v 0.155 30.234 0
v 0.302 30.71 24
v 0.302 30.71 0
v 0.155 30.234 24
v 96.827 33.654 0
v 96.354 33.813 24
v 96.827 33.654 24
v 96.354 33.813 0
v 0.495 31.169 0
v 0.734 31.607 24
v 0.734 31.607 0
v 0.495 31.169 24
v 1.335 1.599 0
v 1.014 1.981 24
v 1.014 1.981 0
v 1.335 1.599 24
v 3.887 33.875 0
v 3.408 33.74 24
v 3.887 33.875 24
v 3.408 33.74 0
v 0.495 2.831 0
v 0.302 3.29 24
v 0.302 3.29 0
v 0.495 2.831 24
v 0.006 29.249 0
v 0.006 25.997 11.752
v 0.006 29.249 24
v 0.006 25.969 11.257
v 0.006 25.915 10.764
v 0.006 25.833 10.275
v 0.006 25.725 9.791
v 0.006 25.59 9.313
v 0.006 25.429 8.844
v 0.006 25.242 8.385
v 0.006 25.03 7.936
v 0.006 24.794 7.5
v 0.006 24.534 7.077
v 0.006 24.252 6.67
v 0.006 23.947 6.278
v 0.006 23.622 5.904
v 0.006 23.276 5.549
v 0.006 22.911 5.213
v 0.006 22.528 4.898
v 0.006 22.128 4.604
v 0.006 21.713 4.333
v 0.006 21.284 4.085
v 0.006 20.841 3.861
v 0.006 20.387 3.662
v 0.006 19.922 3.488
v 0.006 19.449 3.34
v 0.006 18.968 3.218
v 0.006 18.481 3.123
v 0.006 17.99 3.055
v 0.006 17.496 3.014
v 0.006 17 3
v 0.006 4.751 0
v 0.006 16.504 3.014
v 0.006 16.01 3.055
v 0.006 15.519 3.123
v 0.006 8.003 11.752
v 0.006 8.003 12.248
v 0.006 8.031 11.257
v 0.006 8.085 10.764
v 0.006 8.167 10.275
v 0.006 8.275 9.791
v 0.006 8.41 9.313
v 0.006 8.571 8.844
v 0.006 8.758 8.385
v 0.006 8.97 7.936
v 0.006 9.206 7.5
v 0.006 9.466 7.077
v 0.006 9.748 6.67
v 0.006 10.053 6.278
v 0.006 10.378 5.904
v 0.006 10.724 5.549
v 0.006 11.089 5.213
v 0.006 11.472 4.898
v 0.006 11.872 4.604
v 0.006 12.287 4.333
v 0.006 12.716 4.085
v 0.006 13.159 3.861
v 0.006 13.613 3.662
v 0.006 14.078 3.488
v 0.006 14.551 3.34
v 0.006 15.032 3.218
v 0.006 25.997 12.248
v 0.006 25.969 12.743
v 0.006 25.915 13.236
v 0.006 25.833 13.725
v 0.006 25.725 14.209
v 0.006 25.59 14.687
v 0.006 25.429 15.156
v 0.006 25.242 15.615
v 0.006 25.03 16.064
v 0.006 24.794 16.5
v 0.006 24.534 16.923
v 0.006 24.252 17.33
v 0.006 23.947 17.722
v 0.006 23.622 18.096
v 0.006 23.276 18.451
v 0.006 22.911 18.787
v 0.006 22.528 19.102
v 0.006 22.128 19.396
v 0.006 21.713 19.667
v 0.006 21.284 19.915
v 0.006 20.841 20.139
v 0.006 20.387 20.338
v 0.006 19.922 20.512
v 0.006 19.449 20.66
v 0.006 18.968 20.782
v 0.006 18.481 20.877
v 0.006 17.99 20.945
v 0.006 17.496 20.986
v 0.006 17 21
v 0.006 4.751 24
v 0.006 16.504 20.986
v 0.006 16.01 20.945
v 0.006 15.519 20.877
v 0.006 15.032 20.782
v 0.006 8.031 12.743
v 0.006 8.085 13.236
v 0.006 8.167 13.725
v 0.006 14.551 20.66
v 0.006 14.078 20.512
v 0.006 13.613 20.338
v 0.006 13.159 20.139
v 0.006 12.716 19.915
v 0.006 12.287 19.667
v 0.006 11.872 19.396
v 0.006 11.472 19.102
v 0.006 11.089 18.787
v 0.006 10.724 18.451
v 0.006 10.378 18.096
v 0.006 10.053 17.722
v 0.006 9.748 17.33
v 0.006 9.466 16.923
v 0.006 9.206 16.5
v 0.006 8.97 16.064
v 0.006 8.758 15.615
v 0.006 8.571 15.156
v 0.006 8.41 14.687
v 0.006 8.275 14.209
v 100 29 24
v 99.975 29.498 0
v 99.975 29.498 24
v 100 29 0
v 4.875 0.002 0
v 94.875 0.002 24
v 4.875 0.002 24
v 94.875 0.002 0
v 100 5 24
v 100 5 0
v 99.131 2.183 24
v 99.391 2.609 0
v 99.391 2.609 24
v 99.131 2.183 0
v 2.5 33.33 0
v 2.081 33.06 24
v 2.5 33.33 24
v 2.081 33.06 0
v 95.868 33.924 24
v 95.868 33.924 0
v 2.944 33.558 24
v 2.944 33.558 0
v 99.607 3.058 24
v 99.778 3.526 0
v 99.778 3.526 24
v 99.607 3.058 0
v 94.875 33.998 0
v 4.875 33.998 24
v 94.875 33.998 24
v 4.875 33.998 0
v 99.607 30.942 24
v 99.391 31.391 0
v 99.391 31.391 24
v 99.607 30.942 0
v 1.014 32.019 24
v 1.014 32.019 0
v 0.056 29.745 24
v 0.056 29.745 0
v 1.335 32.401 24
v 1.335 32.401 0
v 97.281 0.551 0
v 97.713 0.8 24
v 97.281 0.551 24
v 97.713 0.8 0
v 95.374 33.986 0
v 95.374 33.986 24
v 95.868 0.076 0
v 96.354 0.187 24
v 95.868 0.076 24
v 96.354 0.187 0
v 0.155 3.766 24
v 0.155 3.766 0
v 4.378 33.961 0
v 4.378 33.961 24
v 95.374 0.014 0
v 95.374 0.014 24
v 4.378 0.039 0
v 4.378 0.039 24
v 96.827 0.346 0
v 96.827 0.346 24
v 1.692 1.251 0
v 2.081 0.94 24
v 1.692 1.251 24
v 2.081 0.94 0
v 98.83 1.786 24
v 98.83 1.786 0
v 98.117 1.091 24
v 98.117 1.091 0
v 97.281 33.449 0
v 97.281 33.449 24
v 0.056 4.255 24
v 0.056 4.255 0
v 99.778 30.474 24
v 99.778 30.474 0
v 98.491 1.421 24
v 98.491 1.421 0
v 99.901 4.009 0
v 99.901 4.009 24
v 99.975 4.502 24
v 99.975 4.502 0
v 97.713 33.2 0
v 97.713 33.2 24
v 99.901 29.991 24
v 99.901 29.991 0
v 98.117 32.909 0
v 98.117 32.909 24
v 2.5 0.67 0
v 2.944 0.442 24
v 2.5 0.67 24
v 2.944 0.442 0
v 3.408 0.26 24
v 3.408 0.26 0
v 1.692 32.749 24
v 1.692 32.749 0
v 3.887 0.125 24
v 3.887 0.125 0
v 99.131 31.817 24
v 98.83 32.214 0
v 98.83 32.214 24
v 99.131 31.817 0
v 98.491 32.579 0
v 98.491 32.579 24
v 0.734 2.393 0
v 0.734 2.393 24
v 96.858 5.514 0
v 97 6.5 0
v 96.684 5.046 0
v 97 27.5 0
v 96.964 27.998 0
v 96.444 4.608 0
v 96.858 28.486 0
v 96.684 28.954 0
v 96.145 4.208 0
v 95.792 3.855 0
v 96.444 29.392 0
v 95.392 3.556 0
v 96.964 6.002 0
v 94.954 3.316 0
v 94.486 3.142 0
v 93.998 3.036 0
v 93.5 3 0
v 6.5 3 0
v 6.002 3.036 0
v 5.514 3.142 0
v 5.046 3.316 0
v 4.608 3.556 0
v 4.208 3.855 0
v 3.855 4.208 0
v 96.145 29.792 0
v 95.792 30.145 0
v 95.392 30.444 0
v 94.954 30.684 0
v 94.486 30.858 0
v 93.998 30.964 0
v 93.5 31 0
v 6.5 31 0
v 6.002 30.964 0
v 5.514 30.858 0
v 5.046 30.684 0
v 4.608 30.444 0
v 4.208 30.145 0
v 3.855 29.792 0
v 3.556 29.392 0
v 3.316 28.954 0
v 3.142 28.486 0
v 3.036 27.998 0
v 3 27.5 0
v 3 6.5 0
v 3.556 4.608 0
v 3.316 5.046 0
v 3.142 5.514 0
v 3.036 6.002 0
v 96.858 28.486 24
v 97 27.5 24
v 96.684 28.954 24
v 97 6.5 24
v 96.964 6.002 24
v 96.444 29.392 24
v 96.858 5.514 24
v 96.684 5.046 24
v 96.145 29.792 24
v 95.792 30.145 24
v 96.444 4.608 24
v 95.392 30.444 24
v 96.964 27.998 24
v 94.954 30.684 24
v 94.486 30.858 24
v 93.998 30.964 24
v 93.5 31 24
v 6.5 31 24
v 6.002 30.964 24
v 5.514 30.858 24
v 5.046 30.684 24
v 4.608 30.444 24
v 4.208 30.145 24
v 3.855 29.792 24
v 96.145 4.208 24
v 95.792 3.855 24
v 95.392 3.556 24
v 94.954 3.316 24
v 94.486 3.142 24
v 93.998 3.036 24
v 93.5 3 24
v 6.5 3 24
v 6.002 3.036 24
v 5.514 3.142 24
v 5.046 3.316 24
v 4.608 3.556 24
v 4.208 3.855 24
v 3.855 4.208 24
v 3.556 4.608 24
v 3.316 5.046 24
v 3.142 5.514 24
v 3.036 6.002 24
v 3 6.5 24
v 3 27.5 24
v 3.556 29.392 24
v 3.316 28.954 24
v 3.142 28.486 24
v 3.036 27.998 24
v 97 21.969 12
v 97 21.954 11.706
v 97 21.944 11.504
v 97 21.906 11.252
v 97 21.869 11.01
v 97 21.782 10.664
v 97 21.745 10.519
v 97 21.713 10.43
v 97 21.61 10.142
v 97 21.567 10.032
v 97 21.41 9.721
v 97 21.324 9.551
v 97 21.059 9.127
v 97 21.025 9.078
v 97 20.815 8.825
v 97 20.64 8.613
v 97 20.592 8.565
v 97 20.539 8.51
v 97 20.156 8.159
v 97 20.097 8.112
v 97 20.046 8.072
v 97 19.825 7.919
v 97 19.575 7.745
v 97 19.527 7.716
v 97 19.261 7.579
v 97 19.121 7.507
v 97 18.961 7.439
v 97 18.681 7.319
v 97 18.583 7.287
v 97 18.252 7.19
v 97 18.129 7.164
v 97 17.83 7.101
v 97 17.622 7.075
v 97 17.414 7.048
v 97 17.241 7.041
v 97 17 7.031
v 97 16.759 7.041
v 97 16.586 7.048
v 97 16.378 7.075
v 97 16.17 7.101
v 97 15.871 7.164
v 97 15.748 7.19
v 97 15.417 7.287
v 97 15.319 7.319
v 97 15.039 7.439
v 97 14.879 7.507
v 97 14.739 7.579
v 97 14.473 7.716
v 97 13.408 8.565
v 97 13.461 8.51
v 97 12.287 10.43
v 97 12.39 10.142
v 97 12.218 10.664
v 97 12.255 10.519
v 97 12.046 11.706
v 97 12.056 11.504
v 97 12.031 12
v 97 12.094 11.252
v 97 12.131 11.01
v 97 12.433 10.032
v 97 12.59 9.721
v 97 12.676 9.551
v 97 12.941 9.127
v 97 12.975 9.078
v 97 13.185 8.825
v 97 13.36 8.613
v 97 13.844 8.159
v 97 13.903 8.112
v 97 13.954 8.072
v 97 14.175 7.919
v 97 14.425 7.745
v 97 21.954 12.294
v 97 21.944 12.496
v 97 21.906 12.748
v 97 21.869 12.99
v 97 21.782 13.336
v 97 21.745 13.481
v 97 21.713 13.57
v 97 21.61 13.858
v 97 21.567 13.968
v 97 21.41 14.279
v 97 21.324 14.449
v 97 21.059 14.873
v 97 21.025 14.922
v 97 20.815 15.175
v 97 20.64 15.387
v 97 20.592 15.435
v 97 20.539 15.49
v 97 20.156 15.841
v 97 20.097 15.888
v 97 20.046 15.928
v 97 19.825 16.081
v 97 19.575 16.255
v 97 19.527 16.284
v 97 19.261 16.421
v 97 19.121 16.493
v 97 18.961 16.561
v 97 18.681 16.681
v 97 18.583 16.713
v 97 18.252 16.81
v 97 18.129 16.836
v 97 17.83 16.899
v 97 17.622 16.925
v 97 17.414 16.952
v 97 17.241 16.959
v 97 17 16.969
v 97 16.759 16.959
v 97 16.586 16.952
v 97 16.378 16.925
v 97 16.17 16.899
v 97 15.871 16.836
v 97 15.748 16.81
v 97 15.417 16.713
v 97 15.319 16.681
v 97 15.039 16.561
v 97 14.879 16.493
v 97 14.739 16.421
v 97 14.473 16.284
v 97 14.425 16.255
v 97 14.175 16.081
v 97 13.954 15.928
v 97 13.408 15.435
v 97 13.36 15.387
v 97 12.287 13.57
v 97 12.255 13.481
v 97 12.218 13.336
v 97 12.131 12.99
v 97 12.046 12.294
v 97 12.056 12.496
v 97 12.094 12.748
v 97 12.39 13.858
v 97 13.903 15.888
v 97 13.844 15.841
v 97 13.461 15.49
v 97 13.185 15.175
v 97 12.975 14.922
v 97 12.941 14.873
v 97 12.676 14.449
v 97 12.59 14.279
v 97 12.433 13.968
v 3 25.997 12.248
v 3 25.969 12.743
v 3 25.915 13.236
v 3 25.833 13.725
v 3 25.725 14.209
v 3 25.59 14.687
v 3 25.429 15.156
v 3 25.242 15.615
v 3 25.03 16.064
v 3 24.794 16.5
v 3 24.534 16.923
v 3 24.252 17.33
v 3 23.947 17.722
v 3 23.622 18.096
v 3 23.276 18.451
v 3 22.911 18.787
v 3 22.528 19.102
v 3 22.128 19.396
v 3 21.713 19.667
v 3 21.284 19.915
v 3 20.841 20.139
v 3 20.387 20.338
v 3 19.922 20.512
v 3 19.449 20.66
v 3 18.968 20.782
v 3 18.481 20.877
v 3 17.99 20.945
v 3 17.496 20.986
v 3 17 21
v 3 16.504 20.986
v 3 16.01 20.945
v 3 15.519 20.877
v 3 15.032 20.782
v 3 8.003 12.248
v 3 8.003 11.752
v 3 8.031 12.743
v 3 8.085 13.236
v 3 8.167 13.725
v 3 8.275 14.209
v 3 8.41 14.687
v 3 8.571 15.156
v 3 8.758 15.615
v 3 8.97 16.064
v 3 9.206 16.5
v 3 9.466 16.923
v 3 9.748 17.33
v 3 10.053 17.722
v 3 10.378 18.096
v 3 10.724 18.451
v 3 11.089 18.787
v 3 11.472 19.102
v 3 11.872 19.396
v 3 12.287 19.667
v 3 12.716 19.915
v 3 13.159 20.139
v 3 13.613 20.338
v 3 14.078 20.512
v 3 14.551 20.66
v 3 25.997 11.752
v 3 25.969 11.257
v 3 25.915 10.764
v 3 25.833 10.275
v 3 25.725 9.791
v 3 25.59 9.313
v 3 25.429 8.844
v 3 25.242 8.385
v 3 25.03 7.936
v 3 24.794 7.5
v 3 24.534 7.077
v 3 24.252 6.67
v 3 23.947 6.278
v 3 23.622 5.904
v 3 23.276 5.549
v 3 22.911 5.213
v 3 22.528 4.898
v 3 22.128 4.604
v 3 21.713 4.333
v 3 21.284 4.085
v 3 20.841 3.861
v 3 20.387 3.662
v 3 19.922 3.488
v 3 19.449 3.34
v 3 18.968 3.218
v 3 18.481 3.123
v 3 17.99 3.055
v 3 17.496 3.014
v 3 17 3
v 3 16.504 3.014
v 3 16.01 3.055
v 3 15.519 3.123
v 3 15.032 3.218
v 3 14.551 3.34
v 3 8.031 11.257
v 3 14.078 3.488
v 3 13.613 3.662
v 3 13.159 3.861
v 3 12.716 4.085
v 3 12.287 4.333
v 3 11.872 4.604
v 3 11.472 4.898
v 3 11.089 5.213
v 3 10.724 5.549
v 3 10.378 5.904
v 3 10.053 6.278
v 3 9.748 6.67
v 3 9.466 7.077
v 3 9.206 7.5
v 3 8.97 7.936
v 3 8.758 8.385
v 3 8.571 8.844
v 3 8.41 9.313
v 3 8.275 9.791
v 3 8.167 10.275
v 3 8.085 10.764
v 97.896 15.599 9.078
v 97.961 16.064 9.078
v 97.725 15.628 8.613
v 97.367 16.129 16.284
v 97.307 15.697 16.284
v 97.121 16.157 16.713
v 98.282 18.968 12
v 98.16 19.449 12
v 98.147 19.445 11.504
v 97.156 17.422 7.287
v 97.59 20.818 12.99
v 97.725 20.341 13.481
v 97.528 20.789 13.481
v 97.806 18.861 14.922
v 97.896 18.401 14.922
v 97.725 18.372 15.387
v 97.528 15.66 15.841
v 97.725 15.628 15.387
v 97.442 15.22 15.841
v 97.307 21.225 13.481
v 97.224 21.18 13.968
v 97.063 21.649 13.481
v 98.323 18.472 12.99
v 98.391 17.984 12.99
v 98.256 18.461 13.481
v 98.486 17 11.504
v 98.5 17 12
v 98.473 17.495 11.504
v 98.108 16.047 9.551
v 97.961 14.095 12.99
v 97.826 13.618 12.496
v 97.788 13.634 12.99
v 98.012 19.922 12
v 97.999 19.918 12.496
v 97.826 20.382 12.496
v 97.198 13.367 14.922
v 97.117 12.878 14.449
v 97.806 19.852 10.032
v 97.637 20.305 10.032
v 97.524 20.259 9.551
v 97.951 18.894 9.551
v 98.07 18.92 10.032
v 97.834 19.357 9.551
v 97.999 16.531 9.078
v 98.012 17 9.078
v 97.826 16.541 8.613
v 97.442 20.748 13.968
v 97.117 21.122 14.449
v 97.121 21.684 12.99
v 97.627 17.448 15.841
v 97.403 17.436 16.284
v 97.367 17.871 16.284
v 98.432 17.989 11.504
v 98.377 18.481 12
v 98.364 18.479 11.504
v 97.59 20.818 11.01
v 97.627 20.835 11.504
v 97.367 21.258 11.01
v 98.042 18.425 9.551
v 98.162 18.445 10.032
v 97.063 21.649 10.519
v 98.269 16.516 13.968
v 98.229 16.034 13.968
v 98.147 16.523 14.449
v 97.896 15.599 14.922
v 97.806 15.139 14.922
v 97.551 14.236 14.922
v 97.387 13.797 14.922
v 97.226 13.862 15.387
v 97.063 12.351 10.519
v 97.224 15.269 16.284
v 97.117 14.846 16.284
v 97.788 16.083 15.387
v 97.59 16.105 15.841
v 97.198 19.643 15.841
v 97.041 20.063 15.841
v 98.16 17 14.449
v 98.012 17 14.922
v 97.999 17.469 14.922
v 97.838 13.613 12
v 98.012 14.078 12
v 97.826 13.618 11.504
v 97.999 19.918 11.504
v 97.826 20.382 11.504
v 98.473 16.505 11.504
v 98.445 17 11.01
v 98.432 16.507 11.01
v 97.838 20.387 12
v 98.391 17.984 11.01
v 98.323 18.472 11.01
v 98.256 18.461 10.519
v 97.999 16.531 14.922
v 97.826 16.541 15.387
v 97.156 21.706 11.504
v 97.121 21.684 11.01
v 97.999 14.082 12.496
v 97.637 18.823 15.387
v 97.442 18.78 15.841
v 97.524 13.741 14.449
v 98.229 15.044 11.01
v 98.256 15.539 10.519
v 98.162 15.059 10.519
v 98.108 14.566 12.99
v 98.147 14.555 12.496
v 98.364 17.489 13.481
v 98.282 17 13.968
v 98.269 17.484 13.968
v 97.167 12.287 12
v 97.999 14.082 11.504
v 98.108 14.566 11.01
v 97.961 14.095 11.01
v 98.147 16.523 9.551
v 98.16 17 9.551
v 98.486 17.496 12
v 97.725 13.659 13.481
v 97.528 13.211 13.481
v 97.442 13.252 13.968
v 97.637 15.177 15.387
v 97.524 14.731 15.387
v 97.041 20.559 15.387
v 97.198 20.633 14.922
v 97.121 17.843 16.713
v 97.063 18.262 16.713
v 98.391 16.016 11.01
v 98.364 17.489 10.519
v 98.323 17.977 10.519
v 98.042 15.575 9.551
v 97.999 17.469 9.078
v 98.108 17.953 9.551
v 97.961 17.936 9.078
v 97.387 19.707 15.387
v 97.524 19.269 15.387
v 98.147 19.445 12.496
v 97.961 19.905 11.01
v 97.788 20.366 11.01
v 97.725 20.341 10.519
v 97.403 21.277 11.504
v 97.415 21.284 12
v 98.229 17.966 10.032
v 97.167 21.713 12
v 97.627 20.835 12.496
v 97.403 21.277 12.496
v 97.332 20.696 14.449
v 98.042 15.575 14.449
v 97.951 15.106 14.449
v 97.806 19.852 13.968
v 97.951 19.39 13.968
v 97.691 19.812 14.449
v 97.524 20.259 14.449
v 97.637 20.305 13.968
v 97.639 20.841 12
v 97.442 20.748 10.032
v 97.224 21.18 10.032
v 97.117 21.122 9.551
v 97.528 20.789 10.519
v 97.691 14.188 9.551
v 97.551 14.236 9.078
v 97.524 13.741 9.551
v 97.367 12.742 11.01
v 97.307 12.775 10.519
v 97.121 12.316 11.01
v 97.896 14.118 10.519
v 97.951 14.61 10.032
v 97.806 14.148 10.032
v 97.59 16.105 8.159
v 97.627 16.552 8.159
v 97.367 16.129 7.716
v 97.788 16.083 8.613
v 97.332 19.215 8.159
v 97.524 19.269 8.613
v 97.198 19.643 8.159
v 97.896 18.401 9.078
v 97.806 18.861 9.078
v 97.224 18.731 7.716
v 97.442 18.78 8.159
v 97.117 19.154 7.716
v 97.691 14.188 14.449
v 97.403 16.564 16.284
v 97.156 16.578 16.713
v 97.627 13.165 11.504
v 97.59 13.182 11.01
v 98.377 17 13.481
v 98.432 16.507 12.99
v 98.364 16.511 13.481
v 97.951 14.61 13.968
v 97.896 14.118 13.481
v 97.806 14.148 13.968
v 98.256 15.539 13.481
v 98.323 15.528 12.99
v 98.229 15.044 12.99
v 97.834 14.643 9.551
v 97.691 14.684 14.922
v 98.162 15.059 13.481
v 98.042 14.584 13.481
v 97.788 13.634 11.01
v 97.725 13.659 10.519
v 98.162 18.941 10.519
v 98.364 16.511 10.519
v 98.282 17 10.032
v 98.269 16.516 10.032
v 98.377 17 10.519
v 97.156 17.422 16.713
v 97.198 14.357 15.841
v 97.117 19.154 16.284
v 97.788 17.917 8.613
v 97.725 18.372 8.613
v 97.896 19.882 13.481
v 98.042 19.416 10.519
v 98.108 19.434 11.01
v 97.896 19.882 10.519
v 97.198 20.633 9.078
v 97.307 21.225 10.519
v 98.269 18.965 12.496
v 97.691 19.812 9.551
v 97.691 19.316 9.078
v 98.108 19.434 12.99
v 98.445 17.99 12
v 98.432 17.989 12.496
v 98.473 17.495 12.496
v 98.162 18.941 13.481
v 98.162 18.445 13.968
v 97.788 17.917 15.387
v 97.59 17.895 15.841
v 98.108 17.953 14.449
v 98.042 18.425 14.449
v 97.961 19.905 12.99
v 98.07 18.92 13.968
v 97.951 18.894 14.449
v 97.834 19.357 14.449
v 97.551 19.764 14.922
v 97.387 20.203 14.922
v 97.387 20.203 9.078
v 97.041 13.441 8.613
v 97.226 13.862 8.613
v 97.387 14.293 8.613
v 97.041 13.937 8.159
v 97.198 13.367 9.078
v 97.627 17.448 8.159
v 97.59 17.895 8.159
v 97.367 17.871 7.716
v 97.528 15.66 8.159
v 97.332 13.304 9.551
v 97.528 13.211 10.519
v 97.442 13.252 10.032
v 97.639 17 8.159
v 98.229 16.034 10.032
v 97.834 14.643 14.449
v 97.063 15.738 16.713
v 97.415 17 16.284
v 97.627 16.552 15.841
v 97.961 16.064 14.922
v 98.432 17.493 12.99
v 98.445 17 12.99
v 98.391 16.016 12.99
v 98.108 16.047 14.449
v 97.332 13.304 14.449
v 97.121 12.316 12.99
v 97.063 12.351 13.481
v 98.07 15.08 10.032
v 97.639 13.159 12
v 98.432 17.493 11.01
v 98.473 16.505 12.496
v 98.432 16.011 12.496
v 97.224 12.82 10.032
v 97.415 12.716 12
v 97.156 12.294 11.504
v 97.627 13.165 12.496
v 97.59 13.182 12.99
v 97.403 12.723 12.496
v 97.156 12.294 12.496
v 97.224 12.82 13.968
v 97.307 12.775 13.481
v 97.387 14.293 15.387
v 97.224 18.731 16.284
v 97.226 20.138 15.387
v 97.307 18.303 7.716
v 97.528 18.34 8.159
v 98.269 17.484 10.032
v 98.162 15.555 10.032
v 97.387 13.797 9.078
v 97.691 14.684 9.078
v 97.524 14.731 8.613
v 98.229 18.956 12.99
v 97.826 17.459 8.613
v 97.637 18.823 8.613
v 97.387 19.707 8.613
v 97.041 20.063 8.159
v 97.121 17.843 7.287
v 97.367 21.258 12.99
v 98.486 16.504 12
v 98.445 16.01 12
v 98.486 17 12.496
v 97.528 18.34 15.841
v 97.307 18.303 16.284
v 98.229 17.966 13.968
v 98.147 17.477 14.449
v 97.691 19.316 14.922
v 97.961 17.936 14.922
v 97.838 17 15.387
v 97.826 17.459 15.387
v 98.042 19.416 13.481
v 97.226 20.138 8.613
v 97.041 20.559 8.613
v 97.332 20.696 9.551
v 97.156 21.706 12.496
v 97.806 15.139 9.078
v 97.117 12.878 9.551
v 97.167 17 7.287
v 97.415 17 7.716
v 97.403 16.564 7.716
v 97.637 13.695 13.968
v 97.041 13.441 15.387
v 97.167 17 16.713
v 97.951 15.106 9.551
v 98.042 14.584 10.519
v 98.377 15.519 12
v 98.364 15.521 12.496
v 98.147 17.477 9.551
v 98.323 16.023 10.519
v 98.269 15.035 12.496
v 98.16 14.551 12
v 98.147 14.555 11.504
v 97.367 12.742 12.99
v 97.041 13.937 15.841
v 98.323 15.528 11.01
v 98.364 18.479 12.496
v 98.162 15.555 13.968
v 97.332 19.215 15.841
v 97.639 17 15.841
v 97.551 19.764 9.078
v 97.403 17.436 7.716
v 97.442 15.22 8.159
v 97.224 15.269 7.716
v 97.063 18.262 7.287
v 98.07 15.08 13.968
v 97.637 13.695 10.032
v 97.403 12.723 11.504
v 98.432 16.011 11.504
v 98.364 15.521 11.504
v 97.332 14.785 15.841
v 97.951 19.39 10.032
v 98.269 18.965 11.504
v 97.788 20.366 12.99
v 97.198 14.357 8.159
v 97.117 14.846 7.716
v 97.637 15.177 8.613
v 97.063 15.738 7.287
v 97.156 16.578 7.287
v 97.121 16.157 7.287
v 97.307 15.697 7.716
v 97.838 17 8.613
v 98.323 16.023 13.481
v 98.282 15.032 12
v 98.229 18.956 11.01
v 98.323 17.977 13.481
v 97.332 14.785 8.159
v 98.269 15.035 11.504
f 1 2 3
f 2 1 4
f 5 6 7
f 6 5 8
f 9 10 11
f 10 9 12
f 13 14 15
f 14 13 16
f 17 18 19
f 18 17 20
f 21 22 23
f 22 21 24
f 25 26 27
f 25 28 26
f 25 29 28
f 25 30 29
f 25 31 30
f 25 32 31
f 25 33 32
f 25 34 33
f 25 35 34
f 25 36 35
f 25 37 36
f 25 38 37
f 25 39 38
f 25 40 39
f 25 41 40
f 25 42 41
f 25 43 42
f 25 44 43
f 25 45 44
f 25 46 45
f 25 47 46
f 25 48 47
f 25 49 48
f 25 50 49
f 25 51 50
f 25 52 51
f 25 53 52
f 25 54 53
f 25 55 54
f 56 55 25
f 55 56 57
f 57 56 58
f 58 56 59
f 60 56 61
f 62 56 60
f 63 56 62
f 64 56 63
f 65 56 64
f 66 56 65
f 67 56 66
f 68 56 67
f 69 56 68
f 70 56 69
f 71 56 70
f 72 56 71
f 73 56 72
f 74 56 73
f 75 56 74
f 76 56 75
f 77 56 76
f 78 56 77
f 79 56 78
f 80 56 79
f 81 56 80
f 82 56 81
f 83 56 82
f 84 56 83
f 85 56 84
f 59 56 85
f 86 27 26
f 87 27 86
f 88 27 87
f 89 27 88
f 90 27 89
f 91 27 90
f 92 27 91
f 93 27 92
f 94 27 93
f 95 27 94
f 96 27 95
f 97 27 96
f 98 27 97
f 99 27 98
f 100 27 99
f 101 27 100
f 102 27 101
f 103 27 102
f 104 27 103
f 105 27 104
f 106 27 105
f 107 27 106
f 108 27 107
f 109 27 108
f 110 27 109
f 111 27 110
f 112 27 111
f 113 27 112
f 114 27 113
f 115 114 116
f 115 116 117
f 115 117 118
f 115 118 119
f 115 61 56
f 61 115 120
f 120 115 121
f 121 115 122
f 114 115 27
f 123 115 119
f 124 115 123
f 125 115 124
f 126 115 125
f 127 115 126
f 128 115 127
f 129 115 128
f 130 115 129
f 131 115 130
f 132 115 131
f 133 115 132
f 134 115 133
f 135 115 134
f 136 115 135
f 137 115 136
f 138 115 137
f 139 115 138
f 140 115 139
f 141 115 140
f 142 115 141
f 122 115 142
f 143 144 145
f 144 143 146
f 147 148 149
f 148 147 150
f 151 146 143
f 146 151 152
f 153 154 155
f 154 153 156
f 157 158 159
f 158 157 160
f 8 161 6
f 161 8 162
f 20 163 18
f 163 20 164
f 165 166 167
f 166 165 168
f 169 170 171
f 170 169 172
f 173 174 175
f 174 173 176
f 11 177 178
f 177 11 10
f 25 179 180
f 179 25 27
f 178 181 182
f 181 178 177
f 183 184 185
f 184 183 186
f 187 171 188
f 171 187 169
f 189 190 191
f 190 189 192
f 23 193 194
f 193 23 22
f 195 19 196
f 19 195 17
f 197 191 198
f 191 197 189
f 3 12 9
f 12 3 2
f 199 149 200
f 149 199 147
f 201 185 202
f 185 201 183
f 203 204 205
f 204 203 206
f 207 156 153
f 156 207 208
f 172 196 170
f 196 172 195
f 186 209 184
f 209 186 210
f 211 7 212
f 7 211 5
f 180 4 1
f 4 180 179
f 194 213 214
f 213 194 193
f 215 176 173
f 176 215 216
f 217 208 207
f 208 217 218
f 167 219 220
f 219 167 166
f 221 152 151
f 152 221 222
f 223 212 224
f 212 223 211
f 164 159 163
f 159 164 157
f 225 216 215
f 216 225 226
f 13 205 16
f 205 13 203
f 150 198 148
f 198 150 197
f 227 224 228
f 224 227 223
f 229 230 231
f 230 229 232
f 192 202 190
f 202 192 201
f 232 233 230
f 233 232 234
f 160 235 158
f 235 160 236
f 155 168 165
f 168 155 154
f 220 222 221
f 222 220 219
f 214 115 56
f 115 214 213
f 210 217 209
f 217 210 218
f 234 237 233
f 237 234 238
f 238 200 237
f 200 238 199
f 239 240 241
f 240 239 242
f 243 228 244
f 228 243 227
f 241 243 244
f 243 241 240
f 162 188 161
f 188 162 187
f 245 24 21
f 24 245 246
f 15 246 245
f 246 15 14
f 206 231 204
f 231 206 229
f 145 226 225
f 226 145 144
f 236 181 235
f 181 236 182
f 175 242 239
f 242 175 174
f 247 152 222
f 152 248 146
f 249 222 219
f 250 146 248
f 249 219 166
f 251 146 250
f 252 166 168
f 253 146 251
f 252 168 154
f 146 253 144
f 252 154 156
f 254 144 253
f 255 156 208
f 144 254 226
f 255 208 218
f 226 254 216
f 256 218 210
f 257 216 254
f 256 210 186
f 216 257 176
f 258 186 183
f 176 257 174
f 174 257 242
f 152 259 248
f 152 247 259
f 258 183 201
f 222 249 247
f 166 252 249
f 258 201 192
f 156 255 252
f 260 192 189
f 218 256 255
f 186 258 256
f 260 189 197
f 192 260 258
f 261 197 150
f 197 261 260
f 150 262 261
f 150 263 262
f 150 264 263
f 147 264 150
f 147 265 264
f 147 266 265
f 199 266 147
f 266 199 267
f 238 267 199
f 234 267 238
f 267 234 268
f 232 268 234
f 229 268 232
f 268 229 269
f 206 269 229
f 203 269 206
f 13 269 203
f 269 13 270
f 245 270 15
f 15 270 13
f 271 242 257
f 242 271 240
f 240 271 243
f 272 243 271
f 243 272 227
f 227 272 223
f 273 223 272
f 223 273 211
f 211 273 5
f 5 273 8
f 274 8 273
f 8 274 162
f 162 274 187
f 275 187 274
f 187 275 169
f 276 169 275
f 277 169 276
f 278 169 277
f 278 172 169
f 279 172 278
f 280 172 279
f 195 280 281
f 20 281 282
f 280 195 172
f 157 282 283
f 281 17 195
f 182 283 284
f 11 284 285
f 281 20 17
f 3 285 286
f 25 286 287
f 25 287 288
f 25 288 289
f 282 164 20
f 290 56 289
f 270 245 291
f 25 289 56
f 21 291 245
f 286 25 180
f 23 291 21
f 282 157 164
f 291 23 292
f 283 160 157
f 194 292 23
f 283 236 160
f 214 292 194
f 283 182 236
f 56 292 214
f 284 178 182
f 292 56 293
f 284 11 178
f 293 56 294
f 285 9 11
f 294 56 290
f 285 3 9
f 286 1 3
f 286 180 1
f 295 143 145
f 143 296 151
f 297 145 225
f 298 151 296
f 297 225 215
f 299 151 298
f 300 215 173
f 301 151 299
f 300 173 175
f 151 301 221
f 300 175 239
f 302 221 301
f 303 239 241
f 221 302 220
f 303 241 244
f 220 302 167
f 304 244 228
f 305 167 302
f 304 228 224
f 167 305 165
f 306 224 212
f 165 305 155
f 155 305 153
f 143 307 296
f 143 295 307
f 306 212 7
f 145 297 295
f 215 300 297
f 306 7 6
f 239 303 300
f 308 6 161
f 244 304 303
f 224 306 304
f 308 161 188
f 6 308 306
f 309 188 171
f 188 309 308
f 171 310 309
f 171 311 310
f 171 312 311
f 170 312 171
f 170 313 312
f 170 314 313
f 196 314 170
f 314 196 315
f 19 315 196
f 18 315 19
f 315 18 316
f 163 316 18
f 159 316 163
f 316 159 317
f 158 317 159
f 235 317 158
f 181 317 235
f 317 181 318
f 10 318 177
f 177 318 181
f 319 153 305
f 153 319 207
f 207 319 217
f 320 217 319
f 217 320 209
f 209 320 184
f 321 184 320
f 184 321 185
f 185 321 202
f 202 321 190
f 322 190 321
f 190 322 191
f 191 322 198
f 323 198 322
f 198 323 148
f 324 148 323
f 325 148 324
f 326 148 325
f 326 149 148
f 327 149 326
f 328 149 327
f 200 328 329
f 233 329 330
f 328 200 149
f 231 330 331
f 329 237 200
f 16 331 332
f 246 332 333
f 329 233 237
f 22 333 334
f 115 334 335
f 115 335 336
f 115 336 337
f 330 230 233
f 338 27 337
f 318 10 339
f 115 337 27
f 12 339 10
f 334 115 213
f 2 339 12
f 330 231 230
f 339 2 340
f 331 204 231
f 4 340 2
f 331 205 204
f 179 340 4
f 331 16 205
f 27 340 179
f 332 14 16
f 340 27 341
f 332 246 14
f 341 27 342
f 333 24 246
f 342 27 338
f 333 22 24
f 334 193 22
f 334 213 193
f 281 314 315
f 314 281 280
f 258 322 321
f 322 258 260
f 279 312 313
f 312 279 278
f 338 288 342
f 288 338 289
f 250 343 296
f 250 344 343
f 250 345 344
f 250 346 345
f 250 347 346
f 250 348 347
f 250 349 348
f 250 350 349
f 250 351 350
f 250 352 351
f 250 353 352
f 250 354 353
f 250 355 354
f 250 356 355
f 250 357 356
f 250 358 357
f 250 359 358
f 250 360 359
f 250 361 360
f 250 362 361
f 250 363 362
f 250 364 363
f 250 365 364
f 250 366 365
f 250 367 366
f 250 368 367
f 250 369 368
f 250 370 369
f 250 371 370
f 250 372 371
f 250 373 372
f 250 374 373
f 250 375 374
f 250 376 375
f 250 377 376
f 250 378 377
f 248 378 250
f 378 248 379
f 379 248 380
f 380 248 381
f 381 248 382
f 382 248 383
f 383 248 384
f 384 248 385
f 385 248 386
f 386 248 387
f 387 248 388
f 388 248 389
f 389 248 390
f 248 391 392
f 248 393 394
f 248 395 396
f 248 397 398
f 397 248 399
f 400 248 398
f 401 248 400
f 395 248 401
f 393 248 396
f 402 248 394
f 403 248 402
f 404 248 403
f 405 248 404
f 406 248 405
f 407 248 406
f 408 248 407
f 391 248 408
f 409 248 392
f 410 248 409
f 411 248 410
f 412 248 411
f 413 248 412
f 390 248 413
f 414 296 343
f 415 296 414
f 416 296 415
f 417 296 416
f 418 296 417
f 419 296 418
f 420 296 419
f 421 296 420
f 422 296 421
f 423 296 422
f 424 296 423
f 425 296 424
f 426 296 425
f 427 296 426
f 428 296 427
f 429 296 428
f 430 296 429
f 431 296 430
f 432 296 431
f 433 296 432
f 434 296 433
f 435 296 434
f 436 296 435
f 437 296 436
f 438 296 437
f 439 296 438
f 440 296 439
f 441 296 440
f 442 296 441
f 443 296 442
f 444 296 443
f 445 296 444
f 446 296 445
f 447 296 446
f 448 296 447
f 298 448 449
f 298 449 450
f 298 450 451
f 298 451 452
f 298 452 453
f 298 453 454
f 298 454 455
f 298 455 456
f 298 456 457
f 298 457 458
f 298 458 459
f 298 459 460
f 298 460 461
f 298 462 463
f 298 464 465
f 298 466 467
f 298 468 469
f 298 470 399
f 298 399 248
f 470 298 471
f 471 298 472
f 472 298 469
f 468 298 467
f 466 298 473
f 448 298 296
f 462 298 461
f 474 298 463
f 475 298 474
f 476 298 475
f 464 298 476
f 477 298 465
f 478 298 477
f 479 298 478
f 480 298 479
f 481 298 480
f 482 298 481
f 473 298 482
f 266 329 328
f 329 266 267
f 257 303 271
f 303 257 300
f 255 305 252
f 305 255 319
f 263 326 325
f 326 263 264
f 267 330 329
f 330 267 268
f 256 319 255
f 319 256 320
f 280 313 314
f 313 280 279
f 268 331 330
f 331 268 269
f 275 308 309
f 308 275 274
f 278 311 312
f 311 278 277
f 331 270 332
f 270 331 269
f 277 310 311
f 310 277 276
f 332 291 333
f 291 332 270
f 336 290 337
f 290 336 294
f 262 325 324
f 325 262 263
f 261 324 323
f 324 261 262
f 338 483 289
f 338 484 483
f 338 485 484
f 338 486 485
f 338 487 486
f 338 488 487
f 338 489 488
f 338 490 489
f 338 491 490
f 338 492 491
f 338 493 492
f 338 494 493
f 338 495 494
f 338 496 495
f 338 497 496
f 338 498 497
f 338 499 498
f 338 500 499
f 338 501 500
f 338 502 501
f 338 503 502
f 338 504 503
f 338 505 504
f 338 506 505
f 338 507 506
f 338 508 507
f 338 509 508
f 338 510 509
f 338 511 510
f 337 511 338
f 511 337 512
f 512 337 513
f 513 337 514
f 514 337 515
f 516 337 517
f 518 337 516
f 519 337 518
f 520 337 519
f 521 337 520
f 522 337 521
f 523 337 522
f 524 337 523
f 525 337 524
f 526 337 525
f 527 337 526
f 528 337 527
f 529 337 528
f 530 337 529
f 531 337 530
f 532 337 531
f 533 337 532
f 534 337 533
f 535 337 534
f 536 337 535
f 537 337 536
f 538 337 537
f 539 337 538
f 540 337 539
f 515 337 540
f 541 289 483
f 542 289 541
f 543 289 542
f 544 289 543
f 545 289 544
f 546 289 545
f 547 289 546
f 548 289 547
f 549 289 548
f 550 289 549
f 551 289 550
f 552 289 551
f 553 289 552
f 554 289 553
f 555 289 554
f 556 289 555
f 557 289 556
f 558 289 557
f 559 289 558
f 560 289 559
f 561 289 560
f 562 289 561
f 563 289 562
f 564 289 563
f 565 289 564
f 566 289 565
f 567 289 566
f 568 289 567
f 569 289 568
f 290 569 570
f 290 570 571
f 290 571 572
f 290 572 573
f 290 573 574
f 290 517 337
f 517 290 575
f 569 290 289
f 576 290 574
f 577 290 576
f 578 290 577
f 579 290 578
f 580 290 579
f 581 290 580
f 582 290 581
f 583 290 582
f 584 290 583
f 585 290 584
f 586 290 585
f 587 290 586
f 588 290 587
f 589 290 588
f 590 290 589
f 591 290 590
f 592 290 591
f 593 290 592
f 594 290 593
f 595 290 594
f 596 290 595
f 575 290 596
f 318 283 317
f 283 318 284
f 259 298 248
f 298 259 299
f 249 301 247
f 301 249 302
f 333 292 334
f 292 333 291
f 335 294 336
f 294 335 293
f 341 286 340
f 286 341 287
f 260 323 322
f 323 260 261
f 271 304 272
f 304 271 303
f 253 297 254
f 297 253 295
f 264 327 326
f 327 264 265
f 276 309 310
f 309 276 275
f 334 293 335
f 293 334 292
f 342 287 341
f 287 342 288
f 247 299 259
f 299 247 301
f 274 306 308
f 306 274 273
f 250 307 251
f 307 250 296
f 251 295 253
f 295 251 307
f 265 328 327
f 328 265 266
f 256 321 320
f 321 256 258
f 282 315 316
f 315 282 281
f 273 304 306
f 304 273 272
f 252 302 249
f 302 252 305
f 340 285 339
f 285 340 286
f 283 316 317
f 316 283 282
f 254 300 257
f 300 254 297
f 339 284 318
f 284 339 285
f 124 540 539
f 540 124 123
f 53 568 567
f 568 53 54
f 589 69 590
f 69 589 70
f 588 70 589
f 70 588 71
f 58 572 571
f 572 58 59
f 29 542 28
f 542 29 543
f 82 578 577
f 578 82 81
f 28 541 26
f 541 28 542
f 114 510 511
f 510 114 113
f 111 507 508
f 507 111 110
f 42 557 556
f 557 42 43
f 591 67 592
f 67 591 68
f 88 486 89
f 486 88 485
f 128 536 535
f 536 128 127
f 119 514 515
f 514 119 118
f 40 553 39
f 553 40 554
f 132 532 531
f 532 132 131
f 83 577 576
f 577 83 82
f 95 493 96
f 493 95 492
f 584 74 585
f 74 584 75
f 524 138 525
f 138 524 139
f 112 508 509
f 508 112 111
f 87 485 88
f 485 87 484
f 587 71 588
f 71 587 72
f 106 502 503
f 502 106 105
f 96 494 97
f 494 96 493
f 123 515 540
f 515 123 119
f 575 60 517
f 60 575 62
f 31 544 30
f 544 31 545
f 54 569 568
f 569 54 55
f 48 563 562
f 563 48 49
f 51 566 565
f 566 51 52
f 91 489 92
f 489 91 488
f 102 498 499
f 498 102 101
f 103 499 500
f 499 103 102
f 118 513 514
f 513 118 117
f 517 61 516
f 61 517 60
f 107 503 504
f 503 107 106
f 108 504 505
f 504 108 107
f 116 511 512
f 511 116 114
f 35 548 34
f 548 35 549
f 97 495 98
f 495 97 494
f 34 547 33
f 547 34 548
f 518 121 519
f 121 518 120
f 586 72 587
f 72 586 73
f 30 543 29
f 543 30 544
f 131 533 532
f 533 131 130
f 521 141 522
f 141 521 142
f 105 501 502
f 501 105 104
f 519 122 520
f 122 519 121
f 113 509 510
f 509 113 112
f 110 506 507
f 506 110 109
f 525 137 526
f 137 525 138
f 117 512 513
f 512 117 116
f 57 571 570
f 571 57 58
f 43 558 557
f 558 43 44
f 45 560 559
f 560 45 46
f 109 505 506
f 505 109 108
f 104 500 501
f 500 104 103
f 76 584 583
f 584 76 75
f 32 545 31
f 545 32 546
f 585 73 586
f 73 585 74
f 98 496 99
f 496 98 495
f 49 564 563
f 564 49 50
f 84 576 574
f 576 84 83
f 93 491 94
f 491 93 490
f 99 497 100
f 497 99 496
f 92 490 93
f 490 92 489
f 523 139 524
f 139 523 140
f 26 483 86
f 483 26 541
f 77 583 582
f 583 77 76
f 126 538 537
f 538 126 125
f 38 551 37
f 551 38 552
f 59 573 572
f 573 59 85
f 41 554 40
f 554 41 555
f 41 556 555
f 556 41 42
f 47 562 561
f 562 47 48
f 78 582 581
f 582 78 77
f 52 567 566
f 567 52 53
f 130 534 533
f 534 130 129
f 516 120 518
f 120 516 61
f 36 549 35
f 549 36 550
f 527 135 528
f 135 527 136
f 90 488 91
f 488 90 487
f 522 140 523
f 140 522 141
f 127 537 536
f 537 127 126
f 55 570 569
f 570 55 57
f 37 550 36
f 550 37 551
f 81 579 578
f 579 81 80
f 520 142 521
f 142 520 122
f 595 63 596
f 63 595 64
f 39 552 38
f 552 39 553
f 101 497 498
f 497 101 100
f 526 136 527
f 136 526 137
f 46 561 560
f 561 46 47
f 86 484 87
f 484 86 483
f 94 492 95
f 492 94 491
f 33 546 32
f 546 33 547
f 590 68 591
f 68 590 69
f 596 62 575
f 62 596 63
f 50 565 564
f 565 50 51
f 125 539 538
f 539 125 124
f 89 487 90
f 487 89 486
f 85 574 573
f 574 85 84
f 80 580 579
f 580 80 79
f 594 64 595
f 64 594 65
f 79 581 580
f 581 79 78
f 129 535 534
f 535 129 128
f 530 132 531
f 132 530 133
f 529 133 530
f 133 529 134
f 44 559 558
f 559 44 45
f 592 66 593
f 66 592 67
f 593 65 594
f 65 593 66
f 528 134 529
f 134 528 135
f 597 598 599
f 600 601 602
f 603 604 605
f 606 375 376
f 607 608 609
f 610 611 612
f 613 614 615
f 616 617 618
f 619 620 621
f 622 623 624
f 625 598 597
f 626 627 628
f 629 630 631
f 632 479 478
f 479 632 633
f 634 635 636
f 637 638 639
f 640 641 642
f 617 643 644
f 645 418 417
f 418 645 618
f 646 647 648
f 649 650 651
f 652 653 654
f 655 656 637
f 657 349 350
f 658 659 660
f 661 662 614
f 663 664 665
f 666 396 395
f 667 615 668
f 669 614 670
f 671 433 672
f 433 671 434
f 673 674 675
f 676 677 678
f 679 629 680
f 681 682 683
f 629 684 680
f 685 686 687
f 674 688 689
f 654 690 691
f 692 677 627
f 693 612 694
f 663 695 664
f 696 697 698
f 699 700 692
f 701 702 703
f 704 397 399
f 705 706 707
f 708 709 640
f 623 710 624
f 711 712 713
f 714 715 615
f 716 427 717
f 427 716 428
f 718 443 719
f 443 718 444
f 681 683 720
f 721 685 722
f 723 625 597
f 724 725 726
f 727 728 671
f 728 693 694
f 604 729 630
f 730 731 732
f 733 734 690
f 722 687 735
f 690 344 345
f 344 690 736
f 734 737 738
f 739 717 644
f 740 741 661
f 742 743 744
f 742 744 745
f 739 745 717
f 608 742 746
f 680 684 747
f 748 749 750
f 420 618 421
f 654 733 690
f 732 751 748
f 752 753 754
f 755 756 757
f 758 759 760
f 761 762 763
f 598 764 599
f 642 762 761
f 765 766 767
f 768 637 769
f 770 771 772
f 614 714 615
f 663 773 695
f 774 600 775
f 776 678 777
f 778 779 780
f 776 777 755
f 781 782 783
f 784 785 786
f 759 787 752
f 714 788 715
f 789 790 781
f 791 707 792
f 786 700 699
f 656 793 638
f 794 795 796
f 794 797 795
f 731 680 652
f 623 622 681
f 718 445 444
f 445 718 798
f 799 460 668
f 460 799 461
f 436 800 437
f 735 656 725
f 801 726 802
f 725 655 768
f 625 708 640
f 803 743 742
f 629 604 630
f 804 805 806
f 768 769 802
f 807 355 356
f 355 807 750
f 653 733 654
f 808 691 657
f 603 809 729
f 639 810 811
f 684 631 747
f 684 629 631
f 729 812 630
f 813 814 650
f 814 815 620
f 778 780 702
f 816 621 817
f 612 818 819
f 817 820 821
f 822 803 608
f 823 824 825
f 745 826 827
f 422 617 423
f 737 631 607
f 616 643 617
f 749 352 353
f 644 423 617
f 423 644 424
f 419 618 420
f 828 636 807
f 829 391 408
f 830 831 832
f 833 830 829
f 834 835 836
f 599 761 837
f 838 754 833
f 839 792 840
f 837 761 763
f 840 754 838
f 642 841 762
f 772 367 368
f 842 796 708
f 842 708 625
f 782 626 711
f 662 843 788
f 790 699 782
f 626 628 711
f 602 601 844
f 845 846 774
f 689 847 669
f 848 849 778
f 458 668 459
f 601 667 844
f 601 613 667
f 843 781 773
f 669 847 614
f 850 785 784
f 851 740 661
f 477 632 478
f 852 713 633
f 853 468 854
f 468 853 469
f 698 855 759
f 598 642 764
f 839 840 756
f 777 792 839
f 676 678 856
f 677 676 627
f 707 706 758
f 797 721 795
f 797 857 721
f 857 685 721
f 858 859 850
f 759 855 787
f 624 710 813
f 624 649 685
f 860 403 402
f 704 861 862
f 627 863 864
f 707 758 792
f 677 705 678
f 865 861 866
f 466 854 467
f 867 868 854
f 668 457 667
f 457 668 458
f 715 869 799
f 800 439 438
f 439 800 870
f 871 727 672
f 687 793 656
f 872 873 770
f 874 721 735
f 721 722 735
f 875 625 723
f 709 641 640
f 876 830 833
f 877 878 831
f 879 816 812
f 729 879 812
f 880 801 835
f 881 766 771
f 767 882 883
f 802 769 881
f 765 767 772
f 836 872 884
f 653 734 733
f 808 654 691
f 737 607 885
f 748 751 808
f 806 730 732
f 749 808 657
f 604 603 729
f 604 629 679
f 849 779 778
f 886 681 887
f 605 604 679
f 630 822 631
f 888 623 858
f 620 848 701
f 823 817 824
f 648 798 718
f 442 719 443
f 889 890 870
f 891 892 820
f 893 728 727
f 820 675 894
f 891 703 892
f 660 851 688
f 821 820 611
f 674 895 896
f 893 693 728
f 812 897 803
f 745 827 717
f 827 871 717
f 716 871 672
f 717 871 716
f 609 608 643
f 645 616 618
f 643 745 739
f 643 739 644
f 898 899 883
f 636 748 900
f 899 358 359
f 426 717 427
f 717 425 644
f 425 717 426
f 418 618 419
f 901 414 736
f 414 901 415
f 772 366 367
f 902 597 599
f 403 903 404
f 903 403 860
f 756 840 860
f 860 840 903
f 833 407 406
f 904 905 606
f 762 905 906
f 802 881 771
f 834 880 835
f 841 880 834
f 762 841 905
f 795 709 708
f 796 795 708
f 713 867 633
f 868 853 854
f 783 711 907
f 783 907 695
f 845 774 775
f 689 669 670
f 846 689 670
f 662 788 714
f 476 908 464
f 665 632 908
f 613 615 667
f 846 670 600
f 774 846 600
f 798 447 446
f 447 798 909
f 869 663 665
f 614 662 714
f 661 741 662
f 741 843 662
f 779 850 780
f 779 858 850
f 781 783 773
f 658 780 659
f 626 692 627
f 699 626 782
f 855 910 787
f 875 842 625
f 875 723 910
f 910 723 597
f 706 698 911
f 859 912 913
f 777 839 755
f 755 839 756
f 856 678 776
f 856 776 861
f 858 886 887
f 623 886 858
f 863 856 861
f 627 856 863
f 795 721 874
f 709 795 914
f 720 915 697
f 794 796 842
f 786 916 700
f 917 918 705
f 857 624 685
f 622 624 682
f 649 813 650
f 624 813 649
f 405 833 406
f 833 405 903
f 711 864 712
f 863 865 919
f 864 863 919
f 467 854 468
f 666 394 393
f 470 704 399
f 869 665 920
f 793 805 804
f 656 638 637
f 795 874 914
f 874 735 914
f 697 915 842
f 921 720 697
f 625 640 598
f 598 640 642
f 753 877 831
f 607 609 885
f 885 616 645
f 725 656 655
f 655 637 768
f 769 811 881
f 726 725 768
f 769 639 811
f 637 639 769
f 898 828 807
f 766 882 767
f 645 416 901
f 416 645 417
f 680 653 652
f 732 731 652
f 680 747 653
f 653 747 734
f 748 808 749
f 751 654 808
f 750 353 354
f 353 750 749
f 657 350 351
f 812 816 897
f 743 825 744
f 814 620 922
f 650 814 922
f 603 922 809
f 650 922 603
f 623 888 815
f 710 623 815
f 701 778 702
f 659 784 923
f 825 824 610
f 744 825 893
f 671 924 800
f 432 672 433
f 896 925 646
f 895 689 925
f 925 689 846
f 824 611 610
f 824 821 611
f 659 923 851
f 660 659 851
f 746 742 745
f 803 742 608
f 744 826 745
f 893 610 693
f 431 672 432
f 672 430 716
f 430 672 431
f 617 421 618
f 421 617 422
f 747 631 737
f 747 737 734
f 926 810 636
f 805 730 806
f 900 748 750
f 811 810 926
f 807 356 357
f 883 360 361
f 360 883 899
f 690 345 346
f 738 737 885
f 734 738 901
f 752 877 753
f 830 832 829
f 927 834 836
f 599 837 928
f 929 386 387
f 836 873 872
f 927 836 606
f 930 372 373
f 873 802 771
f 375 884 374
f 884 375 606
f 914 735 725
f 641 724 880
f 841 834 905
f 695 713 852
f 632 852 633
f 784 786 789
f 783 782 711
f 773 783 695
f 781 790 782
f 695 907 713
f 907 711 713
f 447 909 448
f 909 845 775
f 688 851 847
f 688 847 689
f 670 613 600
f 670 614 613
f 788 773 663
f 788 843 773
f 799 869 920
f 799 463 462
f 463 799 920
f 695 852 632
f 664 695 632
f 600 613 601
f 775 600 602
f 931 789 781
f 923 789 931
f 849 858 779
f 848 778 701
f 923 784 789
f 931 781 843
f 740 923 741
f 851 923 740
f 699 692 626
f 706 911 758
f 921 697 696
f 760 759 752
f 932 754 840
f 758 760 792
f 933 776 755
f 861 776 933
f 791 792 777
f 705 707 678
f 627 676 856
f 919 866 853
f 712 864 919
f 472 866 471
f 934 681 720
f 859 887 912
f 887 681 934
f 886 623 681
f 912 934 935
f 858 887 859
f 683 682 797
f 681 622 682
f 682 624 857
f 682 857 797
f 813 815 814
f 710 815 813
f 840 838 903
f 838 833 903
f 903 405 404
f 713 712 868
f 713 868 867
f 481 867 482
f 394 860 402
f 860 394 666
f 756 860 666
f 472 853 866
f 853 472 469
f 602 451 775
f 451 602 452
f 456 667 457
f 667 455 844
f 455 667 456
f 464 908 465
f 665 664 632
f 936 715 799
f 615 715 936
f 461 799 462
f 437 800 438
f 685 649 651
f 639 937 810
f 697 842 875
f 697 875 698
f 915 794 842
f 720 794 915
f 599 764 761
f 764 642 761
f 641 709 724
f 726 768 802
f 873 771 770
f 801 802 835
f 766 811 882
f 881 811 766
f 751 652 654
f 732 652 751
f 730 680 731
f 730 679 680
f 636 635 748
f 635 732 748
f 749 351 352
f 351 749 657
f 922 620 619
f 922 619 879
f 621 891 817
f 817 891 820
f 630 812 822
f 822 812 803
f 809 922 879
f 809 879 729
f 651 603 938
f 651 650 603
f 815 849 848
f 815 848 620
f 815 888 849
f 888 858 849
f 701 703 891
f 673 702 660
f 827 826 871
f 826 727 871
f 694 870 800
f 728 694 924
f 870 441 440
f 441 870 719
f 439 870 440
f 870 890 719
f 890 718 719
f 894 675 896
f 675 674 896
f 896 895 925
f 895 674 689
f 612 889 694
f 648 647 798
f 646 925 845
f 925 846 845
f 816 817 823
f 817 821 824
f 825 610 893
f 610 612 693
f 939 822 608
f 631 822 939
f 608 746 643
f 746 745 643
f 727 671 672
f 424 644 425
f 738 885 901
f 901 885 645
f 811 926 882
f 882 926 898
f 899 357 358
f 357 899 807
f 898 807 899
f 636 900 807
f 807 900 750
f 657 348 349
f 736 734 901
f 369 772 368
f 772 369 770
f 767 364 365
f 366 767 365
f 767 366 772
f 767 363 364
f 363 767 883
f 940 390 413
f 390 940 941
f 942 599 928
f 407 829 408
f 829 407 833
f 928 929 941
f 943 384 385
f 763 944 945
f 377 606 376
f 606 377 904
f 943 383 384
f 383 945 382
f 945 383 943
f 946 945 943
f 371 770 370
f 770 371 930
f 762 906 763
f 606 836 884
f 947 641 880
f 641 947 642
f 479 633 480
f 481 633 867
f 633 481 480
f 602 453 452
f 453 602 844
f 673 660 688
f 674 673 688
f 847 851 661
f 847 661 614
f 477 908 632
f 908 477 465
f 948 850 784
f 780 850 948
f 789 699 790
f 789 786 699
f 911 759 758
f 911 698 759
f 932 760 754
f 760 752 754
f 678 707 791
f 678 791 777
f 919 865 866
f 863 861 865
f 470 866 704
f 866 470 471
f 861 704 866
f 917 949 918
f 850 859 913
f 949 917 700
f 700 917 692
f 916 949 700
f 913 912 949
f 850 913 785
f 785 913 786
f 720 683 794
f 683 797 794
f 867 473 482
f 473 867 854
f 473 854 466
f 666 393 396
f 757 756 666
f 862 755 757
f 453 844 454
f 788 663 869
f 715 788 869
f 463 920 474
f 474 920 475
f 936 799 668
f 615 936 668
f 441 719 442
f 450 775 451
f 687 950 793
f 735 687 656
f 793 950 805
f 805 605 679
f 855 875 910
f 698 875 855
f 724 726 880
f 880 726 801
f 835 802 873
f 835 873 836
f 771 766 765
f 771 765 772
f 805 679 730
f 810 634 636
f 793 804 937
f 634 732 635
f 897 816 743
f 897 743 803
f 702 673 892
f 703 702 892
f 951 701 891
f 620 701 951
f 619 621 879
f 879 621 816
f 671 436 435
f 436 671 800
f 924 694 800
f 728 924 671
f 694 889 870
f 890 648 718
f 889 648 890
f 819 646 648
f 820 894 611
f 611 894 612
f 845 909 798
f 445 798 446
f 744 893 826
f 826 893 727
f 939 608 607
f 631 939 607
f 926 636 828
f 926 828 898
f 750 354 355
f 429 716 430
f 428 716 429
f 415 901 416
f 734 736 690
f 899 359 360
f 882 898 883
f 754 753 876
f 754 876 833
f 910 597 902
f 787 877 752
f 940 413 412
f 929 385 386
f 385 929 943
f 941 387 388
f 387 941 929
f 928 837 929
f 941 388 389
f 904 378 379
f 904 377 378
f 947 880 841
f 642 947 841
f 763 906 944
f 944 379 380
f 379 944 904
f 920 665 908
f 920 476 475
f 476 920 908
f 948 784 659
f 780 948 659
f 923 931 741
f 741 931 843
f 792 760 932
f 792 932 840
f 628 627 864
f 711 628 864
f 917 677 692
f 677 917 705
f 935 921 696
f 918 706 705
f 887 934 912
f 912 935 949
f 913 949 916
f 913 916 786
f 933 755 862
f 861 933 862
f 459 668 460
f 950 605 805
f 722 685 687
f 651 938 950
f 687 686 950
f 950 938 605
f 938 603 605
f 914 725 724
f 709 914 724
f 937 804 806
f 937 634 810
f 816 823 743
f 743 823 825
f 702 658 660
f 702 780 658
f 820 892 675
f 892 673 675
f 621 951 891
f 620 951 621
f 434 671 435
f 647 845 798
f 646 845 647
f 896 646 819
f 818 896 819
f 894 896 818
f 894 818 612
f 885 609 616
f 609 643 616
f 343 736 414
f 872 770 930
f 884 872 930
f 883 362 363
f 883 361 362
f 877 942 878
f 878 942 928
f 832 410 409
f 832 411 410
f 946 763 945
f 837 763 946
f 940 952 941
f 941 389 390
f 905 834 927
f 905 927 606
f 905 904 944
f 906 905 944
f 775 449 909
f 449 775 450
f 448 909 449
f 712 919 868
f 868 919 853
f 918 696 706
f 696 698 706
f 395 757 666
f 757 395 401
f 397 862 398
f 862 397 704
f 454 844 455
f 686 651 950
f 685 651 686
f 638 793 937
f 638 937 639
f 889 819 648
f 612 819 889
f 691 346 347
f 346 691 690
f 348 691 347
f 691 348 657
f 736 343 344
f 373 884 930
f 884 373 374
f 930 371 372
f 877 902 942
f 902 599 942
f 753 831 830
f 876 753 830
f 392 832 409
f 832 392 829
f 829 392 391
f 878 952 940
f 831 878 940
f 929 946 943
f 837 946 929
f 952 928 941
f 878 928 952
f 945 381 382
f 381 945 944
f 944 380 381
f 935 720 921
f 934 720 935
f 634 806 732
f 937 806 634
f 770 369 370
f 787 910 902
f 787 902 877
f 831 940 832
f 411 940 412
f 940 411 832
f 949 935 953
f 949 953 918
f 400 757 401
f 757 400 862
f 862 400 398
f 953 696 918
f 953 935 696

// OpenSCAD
/*[ Toothbrush holder ]*/
// height in mm
height = 100;

// hole diameter in mm
diameter = 18;

// width around the hole in mm
width = 3;

// wall thickness in mm
thickness = 3;

// corner radies in mm
radius = 5;

// add a dent on the bottom ?
create_dent = true;

difference(){
    
    $fa = 0.5;
    $fs = 0.5;
    
    hull(){
        H = diameter + 2 * width;
        
        translate([radius, radius, H / 2]) cylinder(h = H, r = radius, center = true);
        translate([height - radius, radius, H / 2]) cylinder(h = H, r = radius, center = true);
        
        translate([radius, radius + diameter + 2 * width, H / 2]) cylinder(h = H, r = radius, center = true);
        translate([height - radius, radius + diameter + 2 * width, H / 2]) cylinder(h = H, r = radius, center = true);
    }
    
    translate([0, 0, -1]) hull(){
        H = diameter + 2 * width + 2;
        radius = radius - (thickness / 2);
        
        translate([radius + thickness, radius + thickness, H / 2]) cylinder(h = H, r = radius, center = true);
        translate([height - radius - thickness, radius + thickness, H / 2]) cylinder(h = H, r = radius, center = true);
        
        translate([radius + thickness, radius + diameter + 2 * width, H / 2]) cylinder(h = H, r = radius, center = true);
        translate([height - radius - thickness, radius + diameter + 2 * width, H / 2]) cylinder(h = H, r = radius, center = true);
    }
        
    translate([0, radius + width + diameter / 2, width + diameter / 2]) rotate([0, -90, 0]) cylinder(h = 3 * thickness, r = diameter / 2, center = true);
    
    if(create_dent){
        translate([height - (diameter + thickness) / 2, radius + width + diameter / 2, width + diameter / 2]) sphere(d = diameter);
    }
}
